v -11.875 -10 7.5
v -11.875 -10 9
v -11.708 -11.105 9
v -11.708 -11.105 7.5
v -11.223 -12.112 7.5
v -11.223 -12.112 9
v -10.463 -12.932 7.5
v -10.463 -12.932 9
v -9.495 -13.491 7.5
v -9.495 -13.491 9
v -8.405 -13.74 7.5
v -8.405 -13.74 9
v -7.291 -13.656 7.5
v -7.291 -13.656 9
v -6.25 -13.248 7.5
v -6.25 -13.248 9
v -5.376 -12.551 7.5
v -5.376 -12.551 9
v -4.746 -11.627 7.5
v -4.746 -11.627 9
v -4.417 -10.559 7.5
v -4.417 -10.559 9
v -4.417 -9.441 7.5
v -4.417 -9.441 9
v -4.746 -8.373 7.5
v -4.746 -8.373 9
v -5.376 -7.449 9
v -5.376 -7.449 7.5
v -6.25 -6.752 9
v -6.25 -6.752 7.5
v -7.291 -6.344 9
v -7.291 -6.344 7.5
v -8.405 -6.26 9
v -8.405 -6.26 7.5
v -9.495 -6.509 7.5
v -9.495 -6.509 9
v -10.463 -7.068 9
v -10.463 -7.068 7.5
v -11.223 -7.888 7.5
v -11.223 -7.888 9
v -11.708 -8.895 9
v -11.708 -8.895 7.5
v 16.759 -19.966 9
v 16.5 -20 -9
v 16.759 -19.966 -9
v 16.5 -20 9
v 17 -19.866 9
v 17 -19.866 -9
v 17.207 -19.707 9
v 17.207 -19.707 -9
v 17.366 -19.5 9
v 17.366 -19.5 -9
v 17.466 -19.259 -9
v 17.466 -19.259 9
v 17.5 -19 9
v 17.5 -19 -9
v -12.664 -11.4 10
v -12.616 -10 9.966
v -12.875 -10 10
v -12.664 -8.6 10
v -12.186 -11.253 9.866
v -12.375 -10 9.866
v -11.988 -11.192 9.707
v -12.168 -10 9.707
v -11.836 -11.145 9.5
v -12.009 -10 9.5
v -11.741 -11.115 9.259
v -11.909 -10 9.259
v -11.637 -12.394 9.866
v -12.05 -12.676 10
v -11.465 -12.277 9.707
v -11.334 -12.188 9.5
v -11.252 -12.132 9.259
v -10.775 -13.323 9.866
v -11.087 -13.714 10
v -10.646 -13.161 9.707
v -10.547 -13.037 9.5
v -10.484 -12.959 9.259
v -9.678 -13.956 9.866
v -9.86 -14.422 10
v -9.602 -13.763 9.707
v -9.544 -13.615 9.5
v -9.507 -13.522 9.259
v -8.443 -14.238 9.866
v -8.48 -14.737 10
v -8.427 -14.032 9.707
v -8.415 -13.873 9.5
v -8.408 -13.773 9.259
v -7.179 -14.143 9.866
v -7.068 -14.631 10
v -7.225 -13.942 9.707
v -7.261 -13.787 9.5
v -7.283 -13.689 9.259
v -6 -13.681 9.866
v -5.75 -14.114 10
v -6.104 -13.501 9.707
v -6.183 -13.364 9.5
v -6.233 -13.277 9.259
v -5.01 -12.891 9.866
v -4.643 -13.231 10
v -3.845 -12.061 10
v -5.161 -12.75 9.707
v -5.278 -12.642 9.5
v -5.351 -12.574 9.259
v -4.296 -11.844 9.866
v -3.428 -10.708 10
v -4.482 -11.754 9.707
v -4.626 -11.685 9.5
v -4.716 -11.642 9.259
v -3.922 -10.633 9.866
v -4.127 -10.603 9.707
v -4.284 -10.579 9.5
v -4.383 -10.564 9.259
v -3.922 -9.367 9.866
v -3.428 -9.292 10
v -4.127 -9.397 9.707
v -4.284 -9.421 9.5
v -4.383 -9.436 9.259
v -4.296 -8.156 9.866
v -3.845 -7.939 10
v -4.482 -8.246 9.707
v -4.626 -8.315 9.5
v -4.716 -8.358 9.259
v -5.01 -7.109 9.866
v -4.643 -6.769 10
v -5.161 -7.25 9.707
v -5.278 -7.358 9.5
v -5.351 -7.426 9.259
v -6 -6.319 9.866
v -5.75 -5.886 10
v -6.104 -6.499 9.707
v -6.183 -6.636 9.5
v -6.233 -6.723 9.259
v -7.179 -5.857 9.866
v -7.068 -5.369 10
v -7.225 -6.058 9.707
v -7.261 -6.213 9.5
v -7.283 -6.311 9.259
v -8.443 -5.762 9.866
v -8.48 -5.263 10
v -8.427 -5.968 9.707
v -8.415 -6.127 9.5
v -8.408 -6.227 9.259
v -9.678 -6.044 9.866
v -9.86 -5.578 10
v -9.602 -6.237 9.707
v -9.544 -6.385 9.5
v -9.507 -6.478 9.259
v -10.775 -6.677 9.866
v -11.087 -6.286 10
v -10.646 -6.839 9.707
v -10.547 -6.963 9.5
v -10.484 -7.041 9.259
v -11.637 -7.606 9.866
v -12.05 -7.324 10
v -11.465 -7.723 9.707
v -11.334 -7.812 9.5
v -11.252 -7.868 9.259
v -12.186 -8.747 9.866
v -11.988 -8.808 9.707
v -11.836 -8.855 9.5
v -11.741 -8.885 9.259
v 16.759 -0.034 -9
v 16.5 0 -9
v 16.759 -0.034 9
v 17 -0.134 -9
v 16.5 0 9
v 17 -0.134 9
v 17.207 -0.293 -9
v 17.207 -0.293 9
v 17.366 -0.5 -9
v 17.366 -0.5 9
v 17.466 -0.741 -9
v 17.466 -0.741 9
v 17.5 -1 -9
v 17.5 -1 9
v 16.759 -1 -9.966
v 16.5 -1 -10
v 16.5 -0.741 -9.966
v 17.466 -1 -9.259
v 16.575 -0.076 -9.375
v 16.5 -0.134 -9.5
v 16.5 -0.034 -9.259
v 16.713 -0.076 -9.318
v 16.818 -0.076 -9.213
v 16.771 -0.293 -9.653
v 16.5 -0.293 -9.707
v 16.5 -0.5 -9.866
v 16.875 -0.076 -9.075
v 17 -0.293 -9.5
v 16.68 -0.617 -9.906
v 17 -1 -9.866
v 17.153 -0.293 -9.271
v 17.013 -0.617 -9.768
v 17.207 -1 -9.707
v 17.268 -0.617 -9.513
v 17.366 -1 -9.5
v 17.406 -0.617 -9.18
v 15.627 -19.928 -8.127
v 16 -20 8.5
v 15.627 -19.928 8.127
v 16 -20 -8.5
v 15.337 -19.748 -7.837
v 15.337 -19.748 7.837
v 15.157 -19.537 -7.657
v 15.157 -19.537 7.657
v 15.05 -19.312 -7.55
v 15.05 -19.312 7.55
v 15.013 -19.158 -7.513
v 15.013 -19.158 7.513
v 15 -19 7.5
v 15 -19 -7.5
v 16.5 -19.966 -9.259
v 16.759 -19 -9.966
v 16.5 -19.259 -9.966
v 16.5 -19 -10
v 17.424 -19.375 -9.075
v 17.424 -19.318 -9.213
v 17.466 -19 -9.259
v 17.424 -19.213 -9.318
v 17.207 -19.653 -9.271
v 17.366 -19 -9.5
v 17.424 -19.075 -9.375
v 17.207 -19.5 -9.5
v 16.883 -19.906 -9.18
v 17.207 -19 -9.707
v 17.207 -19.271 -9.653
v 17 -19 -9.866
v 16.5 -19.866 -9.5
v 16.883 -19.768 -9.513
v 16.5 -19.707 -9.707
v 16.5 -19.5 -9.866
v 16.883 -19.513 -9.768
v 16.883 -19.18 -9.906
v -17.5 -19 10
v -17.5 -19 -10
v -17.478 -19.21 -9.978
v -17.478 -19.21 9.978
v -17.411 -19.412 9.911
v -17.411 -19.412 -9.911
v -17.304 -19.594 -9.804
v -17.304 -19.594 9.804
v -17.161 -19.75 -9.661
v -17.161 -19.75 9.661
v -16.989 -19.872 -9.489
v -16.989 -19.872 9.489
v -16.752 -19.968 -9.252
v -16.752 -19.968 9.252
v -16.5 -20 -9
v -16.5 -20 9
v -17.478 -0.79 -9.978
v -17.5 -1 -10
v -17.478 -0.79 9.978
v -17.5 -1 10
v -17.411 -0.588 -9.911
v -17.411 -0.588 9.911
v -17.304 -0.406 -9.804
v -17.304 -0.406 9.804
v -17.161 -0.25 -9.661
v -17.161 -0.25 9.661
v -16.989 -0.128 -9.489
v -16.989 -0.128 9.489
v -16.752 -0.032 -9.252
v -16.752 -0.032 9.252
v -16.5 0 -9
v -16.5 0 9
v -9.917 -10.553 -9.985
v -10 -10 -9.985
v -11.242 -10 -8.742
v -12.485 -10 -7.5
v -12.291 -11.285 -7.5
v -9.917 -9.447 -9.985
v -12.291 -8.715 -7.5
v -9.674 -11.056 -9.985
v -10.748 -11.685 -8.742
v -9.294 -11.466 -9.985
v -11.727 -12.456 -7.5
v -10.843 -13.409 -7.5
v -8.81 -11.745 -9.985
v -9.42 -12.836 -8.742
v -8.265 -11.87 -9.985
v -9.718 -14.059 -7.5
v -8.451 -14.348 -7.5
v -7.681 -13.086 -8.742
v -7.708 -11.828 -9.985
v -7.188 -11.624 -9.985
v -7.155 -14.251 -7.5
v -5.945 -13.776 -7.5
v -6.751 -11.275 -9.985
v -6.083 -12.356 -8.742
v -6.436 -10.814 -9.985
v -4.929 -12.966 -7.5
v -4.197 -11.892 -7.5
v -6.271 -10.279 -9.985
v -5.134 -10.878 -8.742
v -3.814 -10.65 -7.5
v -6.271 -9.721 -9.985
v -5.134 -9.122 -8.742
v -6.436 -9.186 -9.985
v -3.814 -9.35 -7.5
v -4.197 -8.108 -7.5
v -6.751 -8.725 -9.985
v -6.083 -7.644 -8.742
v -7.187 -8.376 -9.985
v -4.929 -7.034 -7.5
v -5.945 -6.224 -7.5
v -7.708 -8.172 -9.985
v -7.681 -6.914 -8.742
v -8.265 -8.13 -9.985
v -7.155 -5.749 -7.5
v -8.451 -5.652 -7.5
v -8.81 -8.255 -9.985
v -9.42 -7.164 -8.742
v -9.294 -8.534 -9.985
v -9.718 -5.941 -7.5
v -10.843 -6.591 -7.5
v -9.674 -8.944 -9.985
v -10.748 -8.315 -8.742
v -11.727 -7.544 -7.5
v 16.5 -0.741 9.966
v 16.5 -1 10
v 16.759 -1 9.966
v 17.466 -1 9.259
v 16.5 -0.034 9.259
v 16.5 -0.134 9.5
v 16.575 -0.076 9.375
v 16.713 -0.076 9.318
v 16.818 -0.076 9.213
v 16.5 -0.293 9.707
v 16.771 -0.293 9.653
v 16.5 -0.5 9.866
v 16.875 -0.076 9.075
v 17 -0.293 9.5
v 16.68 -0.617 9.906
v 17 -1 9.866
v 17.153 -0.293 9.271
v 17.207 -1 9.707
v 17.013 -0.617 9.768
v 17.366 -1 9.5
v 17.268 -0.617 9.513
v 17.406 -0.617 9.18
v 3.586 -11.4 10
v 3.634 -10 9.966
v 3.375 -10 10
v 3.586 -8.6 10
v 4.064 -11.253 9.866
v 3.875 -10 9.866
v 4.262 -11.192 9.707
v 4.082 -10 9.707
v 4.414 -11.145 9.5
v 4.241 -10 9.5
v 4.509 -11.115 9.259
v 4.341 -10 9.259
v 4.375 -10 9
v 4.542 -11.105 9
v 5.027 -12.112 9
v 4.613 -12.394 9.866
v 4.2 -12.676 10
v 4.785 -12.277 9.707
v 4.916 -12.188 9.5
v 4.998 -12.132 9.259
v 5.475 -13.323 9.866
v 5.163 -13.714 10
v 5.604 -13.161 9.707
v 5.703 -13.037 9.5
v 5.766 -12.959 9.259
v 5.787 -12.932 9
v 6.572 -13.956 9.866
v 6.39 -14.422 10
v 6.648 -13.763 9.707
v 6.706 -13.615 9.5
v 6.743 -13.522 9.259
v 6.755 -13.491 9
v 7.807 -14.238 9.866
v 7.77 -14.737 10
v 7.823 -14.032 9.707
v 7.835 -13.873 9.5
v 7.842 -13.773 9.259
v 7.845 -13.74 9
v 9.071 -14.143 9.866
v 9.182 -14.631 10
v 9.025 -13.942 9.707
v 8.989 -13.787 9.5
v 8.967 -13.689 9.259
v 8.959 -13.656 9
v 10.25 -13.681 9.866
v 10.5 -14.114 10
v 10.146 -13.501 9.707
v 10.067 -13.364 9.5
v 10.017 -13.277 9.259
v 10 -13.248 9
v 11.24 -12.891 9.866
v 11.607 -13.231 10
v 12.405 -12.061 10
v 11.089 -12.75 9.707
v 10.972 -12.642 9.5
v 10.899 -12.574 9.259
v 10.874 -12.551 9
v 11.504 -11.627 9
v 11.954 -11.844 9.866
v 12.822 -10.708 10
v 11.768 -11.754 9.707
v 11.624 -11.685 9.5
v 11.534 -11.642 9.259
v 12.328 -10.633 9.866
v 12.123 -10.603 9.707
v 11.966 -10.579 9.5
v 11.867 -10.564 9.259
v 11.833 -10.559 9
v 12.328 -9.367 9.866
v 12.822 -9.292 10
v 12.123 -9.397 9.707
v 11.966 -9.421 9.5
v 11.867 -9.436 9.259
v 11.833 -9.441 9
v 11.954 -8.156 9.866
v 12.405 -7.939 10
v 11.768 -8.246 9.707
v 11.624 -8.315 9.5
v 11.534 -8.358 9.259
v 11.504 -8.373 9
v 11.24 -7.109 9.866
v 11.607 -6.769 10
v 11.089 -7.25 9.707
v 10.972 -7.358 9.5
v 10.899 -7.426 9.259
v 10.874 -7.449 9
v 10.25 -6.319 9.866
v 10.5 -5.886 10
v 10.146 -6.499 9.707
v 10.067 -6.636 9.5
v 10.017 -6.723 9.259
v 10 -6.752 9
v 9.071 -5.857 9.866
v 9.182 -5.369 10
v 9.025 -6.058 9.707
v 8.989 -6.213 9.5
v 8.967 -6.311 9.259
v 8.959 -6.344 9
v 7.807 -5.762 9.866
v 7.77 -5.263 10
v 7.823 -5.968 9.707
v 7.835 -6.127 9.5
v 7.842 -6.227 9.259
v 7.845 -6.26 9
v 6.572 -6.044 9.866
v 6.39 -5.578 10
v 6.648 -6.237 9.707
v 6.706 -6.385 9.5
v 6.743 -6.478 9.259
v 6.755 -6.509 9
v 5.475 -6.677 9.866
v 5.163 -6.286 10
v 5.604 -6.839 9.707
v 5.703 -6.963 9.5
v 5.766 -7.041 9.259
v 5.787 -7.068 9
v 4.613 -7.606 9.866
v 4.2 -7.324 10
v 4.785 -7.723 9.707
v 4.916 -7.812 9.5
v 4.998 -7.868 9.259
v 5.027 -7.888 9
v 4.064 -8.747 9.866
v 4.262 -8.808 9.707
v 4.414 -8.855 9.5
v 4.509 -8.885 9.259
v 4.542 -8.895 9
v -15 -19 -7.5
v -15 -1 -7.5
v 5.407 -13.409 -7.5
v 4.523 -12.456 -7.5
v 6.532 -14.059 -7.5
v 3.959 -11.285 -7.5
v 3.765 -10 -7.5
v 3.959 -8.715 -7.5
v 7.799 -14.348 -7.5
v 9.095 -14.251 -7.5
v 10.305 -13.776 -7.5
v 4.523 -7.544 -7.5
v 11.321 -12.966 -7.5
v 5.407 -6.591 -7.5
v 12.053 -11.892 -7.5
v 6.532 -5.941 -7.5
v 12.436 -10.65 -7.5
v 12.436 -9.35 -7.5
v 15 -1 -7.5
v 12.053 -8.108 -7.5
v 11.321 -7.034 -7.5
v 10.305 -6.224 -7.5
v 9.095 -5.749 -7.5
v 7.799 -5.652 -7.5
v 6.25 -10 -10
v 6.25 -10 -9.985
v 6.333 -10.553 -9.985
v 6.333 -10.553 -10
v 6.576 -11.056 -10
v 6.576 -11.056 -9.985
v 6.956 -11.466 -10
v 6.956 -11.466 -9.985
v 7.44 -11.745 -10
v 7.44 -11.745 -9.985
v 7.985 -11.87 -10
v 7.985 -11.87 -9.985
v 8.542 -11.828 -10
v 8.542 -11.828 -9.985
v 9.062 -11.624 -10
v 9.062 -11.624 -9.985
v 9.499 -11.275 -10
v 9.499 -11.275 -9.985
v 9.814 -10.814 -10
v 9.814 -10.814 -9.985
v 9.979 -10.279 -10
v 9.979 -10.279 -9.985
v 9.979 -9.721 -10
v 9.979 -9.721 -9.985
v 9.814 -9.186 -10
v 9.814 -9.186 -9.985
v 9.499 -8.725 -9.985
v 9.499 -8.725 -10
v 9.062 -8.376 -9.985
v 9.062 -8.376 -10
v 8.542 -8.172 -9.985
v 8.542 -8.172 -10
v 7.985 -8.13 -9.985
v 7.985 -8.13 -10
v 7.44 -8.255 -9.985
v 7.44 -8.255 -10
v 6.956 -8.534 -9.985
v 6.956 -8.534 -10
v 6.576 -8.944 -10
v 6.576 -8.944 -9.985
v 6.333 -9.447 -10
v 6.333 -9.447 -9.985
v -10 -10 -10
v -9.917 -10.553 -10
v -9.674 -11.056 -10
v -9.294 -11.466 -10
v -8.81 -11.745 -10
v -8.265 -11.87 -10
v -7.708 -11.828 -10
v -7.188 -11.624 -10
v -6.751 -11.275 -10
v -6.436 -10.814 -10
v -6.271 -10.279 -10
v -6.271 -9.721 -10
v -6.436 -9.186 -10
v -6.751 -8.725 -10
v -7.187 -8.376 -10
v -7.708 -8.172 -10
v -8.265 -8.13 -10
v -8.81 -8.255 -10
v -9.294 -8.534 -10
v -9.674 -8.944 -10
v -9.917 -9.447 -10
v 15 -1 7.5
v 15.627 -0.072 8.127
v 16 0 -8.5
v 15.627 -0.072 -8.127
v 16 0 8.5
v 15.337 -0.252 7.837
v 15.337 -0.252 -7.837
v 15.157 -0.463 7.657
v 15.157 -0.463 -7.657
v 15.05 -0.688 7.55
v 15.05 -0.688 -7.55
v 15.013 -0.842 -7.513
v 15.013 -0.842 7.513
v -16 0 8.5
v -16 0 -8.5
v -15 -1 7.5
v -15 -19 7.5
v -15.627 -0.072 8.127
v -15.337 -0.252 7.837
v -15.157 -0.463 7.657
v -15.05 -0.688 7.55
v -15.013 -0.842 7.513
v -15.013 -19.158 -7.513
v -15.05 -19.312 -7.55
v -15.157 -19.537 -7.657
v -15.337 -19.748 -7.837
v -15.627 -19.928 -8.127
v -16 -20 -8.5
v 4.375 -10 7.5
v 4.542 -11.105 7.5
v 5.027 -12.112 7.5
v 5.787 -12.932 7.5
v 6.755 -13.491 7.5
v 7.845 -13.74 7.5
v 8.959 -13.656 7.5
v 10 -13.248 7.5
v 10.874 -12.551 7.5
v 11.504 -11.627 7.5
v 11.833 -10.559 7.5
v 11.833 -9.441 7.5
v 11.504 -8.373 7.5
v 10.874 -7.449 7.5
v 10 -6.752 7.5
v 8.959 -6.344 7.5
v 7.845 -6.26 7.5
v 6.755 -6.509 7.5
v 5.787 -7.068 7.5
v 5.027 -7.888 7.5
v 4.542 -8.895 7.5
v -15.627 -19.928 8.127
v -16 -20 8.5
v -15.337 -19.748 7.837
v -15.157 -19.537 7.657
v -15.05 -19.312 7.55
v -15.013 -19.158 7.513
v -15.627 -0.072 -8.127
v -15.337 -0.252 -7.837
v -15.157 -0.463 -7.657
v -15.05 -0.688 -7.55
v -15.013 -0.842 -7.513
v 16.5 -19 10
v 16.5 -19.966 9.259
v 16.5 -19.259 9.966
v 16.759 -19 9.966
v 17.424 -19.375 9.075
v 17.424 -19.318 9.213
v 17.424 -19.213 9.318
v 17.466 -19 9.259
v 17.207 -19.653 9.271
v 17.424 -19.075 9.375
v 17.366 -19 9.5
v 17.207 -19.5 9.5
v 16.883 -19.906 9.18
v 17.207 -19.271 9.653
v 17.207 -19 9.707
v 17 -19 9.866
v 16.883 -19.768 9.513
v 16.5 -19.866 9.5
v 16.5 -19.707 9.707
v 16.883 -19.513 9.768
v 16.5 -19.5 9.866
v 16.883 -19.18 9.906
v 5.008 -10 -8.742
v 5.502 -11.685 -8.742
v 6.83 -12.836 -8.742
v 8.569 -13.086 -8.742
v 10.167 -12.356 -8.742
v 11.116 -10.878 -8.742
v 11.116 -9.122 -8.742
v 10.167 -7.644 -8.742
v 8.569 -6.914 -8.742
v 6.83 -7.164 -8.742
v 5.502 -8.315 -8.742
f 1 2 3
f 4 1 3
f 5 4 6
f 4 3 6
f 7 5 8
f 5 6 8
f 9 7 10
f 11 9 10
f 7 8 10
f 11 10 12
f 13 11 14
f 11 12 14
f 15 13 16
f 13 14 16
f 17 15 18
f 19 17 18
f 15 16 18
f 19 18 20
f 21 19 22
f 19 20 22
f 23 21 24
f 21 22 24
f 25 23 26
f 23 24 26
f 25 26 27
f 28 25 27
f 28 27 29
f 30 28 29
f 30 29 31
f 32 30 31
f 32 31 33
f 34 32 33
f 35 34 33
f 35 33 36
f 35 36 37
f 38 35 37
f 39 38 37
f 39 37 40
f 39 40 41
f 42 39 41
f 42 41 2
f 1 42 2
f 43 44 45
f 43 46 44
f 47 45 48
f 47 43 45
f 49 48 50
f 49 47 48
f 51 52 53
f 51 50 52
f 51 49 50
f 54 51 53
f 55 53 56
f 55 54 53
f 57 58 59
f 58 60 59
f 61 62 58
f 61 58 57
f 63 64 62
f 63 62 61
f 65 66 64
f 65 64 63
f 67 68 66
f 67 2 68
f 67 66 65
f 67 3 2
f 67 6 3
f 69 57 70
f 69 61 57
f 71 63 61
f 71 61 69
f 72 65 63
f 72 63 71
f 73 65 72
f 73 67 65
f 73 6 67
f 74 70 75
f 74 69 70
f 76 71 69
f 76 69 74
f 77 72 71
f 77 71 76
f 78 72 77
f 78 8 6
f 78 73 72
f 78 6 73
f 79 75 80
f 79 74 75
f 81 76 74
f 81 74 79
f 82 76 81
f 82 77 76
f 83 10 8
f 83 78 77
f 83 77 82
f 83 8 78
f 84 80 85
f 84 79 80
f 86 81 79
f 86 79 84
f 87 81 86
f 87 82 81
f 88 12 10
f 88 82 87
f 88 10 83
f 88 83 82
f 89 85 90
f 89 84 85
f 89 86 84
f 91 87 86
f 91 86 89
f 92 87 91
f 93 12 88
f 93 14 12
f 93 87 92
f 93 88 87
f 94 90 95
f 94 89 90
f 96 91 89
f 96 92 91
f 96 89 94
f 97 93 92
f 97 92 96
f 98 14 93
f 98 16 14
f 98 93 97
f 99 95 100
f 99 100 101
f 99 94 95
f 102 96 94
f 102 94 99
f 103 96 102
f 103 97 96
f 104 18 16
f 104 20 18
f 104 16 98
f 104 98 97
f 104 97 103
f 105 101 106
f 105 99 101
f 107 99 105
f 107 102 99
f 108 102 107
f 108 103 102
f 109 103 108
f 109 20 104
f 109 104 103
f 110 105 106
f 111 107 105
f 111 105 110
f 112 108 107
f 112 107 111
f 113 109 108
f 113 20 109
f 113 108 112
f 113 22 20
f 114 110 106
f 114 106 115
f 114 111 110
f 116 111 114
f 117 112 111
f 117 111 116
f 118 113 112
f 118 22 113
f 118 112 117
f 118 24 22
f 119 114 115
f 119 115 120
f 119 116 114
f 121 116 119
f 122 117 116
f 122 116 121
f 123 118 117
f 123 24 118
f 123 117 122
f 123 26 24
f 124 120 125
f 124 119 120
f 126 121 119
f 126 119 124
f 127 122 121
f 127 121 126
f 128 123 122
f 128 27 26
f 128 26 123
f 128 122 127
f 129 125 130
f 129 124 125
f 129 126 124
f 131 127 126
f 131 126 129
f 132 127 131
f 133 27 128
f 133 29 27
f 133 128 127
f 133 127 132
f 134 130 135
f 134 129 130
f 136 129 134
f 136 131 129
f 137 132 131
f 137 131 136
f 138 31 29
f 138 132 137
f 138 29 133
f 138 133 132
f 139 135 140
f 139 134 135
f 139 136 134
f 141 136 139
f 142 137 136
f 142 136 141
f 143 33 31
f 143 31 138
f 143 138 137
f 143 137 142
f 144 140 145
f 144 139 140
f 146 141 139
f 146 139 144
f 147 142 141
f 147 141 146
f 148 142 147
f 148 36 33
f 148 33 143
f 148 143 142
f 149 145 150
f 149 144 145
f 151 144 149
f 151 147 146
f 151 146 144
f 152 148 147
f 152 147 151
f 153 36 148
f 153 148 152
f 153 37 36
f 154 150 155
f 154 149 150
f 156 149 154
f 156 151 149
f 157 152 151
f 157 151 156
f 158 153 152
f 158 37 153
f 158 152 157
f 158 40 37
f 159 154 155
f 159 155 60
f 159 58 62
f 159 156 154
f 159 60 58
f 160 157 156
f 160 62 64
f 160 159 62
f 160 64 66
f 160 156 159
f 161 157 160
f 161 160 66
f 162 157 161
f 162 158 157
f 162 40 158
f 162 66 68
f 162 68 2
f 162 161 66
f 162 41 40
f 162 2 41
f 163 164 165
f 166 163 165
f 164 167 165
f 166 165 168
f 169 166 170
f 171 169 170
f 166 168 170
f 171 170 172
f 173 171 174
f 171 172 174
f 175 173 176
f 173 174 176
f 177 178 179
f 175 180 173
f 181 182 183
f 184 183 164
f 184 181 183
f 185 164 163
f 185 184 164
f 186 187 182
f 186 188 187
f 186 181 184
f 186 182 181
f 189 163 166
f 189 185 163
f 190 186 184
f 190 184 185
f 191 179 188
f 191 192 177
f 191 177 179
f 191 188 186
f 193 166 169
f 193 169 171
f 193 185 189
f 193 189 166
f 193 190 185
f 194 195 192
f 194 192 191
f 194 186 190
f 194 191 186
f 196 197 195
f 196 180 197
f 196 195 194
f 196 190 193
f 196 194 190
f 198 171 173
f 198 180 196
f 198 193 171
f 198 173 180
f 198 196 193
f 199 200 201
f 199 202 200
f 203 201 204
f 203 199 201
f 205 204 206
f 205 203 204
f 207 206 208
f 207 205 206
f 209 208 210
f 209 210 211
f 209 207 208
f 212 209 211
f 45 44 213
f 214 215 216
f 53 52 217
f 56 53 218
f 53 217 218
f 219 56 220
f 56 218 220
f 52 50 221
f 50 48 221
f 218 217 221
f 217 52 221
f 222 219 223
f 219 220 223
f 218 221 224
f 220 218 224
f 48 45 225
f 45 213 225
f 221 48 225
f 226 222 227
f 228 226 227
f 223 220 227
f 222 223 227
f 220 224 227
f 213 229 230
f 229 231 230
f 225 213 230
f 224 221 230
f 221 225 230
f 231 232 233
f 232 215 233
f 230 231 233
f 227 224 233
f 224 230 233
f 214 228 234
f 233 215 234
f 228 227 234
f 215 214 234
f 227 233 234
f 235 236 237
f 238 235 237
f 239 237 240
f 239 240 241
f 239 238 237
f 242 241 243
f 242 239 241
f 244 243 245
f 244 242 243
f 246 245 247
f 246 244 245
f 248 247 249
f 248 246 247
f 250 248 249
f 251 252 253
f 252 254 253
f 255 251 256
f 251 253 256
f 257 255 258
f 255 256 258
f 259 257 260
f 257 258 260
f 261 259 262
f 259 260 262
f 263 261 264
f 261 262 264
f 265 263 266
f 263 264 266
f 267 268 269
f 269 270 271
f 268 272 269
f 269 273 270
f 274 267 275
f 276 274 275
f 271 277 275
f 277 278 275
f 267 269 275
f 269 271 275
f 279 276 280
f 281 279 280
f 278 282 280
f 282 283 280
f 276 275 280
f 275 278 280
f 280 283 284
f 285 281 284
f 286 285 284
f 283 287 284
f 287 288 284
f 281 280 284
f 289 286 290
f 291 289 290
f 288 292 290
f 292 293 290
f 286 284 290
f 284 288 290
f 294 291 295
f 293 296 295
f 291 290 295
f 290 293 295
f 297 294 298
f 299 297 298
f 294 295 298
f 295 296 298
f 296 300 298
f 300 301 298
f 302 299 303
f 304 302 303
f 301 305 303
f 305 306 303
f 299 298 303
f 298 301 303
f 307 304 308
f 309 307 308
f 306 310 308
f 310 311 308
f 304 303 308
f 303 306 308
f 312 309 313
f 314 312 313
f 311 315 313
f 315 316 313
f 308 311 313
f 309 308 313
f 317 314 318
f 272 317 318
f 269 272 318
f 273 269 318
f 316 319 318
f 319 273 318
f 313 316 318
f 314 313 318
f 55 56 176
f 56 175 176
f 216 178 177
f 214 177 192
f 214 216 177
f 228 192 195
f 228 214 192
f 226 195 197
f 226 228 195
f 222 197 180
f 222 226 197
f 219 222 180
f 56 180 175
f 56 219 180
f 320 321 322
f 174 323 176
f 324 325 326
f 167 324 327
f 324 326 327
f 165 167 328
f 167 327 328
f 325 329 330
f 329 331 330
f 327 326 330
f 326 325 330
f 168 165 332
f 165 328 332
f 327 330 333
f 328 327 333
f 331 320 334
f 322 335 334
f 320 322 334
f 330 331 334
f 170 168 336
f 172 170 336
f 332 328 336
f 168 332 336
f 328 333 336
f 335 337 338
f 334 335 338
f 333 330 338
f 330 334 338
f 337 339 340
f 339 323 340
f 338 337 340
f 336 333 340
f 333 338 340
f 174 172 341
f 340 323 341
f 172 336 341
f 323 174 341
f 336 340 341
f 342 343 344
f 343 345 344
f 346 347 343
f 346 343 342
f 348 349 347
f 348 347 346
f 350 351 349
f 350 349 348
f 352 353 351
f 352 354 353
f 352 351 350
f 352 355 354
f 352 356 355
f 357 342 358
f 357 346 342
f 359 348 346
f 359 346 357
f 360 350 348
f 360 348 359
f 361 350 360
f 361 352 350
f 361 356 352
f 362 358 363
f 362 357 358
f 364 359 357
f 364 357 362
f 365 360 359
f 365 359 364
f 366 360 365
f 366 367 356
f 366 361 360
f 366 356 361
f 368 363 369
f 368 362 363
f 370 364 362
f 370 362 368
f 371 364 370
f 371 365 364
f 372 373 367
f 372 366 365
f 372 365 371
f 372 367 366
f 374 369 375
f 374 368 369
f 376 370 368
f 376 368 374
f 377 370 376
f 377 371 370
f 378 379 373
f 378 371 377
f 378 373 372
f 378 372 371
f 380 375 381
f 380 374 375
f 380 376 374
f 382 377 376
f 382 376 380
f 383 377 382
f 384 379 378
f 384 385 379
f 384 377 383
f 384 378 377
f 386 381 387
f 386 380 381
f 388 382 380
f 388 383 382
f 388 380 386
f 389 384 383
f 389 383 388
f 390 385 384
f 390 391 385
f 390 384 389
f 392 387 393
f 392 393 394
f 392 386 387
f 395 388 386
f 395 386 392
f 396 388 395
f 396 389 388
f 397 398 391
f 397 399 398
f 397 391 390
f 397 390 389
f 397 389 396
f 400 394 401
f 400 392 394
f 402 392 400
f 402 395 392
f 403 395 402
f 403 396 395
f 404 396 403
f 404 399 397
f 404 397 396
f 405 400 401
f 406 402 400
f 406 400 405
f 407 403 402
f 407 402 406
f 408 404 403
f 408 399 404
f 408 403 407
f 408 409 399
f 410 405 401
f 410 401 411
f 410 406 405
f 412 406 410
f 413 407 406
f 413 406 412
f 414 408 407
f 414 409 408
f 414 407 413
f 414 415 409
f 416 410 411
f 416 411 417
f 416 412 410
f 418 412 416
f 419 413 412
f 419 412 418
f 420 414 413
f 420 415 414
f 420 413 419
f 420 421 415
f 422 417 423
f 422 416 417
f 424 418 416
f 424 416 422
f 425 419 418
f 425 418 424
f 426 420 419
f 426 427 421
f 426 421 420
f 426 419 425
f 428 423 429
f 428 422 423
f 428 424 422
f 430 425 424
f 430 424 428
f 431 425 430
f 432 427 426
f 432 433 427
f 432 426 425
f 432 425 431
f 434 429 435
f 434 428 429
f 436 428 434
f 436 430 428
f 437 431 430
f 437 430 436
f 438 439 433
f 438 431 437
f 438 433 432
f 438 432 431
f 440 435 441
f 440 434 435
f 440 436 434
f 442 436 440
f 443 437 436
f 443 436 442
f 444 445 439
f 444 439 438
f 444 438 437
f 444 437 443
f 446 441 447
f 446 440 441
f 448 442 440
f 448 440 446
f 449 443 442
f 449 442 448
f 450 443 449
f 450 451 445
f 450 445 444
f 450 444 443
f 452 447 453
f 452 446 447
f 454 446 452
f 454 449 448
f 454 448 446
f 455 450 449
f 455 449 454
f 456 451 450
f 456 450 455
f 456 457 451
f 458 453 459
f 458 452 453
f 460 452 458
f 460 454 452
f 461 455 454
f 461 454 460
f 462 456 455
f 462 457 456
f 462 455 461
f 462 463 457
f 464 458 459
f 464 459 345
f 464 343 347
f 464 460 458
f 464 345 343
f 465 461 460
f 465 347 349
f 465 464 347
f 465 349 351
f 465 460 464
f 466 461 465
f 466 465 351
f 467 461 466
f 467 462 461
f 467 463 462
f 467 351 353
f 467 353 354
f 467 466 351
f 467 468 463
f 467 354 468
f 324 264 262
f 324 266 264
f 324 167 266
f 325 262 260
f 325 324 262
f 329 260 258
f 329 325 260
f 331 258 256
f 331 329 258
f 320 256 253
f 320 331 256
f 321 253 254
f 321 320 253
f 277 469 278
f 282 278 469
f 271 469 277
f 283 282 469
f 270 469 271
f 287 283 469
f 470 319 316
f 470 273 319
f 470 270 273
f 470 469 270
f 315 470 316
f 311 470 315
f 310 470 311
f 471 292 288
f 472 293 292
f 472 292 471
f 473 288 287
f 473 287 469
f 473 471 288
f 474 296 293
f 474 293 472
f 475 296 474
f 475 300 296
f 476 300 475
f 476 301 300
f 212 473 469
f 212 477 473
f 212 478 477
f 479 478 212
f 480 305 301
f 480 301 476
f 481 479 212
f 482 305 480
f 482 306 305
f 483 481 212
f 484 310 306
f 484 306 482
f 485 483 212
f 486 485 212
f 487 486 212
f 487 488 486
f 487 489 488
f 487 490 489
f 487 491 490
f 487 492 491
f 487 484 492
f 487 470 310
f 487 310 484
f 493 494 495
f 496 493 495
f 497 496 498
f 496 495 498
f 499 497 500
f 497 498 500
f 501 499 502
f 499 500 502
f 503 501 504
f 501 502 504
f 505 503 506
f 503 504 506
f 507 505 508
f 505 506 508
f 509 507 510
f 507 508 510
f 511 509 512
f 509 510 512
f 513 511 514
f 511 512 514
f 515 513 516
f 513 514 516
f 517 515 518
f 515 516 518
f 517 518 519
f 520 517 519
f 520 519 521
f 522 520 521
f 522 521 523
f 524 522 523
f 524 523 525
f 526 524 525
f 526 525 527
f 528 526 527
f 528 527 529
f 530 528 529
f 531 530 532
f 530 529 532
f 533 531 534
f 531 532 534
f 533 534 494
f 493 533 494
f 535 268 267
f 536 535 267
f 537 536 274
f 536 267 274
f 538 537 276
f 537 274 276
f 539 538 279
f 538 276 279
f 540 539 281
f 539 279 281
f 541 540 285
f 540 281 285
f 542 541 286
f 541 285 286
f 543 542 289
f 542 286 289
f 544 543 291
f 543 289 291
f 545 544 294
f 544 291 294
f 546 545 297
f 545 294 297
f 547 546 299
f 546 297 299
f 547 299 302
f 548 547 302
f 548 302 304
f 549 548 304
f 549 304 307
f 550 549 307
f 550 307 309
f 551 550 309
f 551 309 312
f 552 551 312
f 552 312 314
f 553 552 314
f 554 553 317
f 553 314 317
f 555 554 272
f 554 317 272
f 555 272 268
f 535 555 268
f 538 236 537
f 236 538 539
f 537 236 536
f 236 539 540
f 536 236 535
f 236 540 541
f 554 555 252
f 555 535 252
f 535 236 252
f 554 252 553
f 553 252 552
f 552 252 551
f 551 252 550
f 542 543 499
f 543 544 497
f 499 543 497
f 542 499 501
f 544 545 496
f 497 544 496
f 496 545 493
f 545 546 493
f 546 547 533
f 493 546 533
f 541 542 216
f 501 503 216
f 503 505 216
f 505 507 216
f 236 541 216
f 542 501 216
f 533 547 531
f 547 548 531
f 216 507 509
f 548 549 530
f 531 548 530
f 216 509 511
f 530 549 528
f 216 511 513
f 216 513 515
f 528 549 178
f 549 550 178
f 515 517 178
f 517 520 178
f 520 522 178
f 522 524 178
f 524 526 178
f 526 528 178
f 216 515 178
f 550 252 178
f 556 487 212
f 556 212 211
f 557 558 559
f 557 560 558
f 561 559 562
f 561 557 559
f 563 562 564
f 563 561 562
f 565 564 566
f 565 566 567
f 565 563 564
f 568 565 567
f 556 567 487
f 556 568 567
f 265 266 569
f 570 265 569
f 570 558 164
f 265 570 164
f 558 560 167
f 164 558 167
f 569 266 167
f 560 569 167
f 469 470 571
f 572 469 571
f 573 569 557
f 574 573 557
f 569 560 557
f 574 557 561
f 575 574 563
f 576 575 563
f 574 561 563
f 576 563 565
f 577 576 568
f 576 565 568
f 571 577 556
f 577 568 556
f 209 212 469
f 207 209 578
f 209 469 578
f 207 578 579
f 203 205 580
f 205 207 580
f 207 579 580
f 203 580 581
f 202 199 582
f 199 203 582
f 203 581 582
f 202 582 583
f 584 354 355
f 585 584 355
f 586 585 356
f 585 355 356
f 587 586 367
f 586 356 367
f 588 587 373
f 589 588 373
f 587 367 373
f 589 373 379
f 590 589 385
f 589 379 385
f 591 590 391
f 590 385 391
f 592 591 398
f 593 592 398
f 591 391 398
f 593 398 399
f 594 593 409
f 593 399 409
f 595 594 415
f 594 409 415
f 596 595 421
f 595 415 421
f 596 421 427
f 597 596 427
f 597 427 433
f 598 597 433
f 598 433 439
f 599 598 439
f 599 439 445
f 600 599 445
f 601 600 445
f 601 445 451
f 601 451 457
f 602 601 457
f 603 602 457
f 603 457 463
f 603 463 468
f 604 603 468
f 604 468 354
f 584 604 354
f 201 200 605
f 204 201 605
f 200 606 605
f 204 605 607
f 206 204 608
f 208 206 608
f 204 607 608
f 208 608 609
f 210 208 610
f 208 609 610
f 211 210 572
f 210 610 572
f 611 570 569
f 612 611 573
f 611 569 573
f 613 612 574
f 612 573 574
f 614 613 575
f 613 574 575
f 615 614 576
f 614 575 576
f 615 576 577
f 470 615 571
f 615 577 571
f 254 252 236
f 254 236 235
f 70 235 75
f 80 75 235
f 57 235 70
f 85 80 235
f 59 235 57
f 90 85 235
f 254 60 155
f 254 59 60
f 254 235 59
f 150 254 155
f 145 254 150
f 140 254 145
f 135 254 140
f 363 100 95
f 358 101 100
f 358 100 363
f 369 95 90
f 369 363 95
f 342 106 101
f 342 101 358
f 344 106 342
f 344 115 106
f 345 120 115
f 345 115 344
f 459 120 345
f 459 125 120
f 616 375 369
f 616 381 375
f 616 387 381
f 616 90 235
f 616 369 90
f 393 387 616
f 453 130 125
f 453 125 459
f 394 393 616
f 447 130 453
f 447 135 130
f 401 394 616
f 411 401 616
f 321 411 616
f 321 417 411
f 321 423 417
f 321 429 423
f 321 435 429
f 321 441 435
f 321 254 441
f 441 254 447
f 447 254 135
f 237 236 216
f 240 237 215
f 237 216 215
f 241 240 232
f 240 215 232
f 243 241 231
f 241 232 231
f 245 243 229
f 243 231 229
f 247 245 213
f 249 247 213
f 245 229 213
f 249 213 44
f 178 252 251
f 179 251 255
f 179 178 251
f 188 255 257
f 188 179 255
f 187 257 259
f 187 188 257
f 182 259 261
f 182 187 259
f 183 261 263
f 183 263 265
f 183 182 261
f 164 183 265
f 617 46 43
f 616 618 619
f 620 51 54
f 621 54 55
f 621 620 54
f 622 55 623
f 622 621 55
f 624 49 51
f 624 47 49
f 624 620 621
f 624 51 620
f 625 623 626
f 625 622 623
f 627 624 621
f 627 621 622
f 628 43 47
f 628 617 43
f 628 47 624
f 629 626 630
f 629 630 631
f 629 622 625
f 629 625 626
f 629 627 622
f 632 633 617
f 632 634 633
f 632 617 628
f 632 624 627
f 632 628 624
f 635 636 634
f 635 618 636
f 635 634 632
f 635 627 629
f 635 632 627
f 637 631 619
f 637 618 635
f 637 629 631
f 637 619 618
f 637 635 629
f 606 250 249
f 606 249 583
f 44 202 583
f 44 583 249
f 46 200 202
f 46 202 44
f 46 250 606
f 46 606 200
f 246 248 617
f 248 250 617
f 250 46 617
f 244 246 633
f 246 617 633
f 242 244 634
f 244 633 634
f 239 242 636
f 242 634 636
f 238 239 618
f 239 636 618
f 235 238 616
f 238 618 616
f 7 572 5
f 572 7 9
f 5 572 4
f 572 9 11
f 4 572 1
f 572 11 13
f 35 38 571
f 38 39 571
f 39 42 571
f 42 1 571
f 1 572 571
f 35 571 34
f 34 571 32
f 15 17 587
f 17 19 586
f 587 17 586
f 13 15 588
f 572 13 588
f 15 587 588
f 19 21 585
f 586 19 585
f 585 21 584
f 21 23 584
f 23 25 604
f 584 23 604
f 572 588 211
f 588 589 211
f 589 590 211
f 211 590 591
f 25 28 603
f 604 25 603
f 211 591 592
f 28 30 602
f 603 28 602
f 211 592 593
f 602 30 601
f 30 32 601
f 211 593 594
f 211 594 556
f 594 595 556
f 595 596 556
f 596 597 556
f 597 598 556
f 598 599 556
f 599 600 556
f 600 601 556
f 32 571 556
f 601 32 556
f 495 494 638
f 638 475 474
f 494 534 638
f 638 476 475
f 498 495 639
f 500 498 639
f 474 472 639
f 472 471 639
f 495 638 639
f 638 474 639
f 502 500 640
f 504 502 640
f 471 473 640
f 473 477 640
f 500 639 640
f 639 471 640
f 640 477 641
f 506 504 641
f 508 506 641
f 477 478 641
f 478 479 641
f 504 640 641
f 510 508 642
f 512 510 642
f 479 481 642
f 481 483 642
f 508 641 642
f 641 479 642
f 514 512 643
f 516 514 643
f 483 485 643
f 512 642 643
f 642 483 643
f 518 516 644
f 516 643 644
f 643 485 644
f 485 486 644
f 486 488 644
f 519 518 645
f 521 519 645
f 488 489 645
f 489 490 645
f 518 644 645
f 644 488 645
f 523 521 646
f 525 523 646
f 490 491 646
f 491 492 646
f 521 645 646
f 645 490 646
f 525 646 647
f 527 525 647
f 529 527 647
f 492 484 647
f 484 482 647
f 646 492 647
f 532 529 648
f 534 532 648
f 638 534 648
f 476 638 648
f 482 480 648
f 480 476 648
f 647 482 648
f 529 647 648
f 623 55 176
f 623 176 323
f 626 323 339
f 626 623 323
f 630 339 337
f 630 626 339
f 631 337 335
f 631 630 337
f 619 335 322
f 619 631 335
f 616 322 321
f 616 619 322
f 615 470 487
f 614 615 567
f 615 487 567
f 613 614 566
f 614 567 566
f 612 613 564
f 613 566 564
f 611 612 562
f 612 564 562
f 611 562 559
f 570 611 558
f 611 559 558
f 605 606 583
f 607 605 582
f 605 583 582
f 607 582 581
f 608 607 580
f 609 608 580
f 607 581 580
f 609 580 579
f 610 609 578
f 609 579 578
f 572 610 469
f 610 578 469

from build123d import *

# Parameters (mm, degrees)
SKETCH_W          = 35
SKETCH_H          = 20
PAD_DEPTH         = 20
SKETCH001_W       = 30
SKETCH001_H       = 15
POCKET_DEPTH      = 0.001
POCKET_DEPTH_BACK = 20.001
SKETCH002_R       = 3.75
POCKET001_DEPTH   = 3.5
SKETCH003_R       = 1.875
POCKET002_DEPTH   = 2.5
CHAMFER_SIZE      = 2.485
FILLET_R          = 1


with BuildPart() as part:
    # Sketch → Pad (new body)
    with BuildSketch(Plane.XZ):
        Rectangle(SKETCH_W, SKETCH_H)
    extrude(amount=PAD_DEPTH)

    # Sketch001 → Pocket (cut, two sides)
    with BuildSketch(Plane.XZ) as pocket_sk:
        Rectangle(SKETCH001_W, SKETCH001_H)
    extrude(amount=-POCKET_DEPTH, mode=Mode.SUBTRACT)
    extrude(pocket_sk.sketch, amount=POCKET_DEPTH_BACK, mode=Mode.SUBTRACT)

    # Sketch002 (on DatumPlane) → Pocket001 (cut)
    with BuildSketch(Plane(origin=(0, 0, 10), x_dir=(-1, 0, 0), z_dir=(0, 0, 1))):
        with Locations((-8.125, 10)):
            Circle(SKETCH002_R)
        with Locations((8.125, 10)):
            Circle(SKETCH002_R)
    extrude(amount=-POCKET001_DEPTH, mode=Mode.SUBTRACT)

    # Sketch003 (on DatumPlane) → Pocket002 (cut)
    with BuildSketch(Plane(origin=(0, 0, -7.5), x_dir=(-1, 0, 0), z_dir=(0, 0, 1))):
        with Locations((-8.125, 10)):
            Circle(SKETCH003_R)
        with Locations((8.125, 10)):
            Circle(SKETCH003_R)
    extrude(amount=-POCKET002_DEPTH, mode=Mode.SUBTRACT)

    # Chamfer
    chamfer_edges = [part.edges().sort_by_distance(p)[0] for p in [
        (-6.25, -10, -7.5),
        (10, -10, -7.5),
    ]]
    chamfer(chamfer_edges, length=CHAMFER_SIZE)

    # Fillet
    fillet_edges = [part.edges().sort_by_distance(p)[0] for p in [
        (-17.5, -20, 0),
        (0, -20, 10),
        (0, -20, -10),
        (17.5, -20, 0),
        (-15, -20, 0),
        (0, -20, 7.5),
        (15, -20, 0),
        (0, -20, -7.5),
        (-4.375, -10, 10),
        (11.875, -10, 10),
        (17.5, -10, 10),
        (17.5, -10, -10),
        (-17.5, 0, 0),
        (0, 0, 10),
        (0, 0, -10),
        (17.5, 0, 0),
        (-15, 0, 0),
        (0, 0, 7.5),
        (15, 0, 0),
        (0, 0, -7.5),
    ]]
    fillet(fillet_edges, radius=FILLET_R)


solid = part.part
